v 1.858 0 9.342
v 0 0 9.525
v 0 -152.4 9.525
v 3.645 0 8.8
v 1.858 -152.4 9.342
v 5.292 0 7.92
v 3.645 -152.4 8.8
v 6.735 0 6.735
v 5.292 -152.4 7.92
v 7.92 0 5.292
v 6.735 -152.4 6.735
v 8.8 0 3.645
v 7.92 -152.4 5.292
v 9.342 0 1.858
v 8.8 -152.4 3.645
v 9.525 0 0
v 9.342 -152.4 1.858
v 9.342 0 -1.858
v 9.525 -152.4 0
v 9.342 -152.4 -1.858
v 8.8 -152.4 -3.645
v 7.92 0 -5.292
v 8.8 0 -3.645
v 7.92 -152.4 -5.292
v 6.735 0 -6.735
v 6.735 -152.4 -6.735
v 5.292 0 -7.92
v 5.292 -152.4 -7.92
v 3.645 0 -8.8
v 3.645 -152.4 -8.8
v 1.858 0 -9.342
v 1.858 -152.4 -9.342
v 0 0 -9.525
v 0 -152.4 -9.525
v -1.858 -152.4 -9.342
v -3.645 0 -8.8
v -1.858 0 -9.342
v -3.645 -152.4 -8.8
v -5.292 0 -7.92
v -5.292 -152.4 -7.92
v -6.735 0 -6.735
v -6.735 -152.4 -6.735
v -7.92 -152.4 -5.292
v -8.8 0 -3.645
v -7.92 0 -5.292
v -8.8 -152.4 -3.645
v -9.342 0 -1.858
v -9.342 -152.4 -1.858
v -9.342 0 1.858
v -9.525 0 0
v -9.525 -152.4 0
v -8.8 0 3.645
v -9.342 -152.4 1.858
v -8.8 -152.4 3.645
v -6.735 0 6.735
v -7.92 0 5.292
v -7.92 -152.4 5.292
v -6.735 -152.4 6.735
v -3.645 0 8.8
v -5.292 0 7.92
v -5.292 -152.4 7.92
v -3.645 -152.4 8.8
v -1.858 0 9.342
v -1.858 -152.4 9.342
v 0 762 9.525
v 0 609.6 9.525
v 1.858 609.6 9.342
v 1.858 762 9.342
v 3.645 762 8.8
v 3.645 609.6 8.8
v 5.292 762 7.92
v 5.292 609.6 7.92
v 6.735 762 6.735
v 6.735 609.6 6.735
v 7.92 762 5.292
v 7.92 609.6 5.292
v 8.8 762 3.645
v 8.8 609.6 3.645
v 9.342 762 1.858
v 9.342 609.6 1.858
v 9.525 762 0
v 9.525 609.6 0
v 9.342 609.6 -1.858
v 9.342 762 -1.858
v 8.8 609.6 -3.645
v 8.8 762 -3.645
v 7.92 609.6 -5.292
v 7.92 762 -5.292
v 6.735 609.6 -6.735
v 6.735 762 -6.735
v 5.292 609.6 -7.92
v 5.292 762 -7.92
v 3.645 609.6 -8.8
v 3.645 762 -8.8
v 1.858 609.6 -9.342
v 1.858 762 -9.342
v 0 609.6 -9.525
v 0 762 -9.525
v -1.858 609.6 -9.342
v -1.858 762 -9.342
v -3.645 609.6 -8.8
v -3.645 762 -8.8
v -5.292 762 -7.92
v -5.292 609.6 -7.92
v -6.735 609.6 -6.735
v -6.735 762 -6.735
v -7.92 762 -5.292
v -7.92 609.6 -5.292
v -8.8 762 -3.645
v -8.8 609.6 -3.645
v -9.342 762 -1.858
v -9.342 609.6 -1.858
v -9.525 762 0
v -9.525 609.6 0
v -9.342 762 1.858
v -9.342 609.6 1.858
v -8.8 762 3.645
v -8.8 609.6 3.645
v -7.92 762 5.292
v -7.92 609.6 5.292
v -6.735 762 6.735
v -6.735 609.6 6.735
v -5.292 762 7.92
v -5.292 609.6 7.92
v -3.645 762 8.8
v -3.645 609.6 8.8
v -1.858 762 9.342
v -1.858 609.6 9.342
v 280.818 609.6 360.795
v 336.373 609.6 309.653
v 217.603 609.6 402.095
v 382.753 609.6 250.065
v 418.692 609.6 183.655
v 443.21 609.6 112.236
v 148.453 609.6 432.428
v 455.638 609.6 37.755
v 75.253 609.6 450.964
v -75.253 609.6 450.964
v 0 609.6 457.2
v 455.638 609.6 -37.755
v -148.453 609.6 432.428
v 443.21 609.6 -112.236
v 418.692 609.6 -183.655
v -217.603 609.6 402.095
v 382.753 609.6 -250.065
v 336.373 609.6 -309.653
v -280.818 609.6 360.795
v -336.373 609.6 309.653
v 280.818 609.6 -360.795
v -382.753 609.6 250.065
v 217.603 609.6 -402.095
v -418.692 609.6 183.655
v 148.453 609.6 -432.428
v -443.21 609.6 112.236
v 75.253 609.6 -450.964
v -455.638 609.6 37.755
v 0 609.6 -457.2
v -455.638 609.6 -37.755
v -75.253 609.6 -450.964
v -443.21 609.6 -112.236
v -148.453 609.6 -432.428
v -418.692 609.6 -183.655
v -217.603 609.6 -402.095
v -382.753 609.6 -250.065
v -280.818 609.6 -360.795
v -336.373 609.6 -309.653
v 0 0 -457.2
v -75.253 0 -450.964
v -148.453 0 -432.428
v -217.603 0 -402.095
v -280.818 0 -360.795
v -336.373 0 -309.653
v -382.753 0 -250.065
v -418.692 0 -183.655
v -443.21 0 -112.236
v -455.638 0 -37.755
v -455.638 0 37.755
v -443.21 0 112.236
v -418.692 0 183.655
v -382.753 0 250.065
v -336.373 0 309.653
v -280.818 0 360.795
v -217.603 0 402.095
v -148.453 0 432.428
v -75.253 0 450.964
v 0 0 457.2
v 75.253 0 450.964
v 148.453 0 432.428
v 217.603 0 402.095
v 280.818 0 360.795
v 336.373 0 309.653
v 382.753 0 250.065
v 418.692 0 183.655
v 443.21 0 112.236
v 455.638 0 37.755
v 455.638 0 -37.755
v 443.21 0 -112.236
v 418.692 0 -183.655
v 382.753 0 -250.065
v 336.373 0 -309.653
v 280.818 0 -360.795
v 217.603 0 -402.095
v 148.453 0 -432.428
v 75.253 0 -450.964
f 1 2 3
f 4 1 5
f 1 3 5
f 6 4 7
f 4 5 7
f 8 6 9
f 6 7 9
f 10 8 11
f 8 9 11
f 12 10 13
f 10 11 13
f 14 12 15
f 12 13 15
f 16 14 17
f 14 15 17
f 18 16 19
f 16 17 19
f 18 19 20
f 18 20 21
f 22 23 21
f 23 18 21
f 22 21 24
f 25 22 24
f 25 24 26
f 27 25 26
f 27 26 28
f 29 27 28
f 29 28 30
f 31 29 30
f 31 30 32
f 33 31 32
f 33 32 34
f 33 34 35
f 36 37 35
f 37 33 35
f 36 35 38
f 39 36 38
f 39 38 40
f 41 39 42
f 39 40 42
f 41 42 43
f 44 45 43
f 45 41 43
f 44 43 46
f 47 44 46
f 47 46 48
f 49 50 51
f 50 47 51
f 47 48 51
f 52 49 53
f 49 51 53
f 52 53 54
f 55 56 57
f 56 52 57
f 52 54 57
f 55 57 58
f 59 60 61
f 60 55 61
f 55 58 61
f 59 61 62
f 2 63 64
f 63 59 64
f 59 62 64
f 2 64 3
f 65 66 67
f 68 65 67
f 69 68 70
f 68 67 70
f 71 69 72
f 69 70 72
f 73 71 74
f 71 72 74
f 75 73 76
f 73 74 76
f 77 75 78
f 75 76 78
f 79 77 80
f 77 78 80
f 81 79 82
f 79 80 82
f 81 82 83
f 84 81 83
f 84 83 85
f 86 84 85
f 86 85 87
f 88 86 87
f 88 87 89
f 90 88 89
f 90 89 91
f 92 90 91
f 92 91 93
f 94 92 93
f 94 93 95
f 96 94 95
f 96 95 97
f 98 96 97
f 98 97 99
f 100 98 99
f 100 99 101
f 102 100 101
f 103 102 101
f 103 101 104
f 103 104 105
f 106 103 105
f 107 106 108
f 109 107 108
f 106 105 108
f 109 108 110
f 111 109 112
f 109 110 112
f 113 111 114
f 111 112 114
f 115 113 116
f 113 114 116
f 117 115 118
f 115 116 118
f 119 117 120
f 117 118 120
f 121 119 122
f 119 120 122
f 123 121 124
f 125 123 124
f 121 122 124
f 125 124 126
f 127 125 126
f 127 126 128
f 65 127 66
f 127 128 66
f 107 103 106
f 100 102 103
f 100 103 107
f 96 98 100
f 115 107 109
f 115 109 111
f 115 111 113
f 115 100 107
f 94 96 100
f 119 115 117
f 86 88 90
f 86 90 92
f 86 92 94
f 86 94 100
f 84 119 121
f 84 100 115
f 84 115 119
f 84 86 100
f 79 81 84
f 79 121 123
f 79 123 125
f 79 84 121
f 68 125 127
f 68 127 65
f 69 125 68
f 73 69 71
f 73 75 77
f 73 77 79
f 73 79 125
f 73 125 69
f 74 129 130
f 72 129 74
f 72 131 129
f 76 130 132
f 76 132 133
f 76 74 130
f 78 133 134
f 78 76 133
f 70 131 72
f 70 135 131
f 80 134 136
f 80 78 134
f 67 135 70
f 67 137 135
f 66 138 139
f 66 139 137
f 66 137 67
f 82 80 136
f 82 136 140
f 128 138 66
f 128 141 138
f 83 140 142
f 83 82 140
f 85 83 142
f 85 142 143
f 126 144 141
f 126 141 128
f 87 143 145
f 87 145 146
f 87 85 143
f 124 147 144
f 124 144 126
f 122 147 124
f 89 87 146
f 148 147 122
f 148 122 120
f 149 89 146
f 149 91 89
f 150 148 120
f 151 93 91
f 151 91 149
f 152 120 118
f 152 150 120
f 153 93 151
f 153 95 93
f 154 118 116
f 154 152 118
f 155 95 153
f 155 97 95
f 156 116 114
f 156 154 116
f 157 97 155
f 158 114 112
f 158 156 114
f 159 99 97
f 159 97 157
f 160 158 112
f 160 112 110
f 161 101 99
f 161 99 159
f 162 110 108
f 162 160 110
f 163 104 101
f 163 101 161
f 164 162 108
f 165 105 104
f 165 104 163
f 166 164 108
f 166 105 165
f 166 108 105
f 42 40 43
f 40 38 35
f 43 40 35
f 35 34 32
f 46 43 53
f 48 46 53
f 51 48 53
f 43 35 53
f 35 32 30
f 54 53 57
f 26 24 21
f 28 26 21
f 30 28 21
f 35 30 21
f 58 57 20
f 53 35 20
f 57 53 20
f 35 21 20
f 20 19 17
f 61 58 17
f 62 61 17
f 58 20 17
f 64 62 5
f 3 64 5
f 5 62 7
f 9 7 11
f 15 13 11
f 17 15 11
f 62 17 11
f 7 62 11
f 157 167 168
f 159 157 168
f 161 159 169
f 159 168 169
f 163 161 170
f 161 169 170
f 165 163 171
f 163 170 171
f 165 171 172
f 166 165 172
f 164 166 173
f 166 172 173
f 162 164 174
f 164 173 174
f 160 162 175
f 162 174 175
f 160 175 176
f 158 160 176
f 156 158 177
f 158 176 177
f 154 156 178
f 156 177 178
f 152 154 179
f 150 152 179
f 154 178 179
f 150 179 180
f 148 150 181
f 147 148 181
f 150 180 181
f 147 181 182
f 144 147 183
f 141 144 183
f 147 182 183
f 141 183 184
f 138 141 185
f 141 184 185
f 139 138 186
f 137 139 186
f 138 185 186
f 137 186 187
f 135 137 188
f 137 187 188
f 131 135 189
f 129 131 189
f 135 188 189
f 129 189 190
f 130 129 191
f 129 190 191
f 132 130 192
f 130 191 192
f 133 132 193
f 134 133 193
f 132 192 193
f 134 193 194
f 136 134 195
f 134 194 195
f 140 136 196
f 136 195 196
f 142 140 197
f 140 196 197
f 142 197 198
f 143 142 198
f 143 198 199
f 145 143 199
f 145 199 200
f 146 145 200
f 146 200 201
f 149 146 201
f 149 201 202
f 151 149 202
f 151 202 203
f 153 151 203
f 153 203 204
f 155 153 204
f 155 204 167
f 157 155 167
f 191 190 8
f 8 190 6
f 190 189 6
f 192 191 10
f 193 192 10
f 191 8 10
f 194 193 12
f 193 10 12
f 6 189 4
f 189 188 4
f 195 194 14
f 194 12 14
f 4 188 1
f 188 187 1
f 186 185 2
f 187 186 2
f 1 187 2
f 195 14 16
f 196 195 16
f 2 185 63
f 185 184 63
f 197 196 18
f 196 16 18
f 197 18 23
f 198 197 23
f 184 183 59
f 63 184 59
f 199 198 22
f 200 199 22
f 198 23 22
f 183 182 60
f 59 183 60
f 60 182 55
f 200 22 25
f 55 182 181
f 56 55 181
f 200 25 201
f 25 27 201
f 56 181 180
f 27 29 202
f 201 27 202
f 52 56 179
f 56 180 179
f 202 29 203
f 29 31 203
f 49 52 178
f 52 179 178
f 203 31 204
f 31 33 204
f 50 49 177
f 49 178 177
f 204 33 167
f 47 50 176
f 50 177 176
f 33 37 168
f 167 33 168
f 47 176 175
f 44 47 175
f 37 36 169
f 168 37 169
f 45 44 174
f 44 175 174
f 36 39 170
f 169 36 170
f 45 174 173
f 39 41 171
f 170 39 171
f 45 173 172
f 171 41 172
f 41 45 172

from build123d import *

# Parameters (mm, degrees)
SKETCH1_R                = 457.2
BOSS_EXTRUDE1_DEPTH      = 609.6
BOSS_EXTRUDE2_DEPTH      = 152.4
BOSS_EXTRUDE2_DEPTH_BACK = 762
SKETCH2_R                = 9.525


with BuildPart() as part:
    # Sketch1 → Boss-Extrude1 (new body)
    with BuildSketch(Plane(origin=(0, 0, 0), x_dir=(1, 0, 0), z_dir=(0, 1, 0))):
        with Locations(Location((0, 0, 0), (0, 0, 90))):
            Circle(SKETCH1_R)
    extrude(amount=BOSS_EXTRUDE1_DEPTH)

    # Sketch2 → Boss-Extrude2 (add, two sides: drawn at the far end of the back side and taken through both)
    with BuildSketch(Plane(origin=(0, 609.6, 0), x_dir=(1, 0, 0), z_dir=(0, 1, 0)).offset(-BOSS_EXTRUDE2_DEPTH_BACK)):
        with Locations(Location((0, 0, 0), (0, 0, 270))):
            Circle(SKETCH2_R)
    extrude(amount=BOSS_EXTRUDE2_DEPTH + BOSS_EXTRUDE2_DEPTH_BACK)


solid = part.part
